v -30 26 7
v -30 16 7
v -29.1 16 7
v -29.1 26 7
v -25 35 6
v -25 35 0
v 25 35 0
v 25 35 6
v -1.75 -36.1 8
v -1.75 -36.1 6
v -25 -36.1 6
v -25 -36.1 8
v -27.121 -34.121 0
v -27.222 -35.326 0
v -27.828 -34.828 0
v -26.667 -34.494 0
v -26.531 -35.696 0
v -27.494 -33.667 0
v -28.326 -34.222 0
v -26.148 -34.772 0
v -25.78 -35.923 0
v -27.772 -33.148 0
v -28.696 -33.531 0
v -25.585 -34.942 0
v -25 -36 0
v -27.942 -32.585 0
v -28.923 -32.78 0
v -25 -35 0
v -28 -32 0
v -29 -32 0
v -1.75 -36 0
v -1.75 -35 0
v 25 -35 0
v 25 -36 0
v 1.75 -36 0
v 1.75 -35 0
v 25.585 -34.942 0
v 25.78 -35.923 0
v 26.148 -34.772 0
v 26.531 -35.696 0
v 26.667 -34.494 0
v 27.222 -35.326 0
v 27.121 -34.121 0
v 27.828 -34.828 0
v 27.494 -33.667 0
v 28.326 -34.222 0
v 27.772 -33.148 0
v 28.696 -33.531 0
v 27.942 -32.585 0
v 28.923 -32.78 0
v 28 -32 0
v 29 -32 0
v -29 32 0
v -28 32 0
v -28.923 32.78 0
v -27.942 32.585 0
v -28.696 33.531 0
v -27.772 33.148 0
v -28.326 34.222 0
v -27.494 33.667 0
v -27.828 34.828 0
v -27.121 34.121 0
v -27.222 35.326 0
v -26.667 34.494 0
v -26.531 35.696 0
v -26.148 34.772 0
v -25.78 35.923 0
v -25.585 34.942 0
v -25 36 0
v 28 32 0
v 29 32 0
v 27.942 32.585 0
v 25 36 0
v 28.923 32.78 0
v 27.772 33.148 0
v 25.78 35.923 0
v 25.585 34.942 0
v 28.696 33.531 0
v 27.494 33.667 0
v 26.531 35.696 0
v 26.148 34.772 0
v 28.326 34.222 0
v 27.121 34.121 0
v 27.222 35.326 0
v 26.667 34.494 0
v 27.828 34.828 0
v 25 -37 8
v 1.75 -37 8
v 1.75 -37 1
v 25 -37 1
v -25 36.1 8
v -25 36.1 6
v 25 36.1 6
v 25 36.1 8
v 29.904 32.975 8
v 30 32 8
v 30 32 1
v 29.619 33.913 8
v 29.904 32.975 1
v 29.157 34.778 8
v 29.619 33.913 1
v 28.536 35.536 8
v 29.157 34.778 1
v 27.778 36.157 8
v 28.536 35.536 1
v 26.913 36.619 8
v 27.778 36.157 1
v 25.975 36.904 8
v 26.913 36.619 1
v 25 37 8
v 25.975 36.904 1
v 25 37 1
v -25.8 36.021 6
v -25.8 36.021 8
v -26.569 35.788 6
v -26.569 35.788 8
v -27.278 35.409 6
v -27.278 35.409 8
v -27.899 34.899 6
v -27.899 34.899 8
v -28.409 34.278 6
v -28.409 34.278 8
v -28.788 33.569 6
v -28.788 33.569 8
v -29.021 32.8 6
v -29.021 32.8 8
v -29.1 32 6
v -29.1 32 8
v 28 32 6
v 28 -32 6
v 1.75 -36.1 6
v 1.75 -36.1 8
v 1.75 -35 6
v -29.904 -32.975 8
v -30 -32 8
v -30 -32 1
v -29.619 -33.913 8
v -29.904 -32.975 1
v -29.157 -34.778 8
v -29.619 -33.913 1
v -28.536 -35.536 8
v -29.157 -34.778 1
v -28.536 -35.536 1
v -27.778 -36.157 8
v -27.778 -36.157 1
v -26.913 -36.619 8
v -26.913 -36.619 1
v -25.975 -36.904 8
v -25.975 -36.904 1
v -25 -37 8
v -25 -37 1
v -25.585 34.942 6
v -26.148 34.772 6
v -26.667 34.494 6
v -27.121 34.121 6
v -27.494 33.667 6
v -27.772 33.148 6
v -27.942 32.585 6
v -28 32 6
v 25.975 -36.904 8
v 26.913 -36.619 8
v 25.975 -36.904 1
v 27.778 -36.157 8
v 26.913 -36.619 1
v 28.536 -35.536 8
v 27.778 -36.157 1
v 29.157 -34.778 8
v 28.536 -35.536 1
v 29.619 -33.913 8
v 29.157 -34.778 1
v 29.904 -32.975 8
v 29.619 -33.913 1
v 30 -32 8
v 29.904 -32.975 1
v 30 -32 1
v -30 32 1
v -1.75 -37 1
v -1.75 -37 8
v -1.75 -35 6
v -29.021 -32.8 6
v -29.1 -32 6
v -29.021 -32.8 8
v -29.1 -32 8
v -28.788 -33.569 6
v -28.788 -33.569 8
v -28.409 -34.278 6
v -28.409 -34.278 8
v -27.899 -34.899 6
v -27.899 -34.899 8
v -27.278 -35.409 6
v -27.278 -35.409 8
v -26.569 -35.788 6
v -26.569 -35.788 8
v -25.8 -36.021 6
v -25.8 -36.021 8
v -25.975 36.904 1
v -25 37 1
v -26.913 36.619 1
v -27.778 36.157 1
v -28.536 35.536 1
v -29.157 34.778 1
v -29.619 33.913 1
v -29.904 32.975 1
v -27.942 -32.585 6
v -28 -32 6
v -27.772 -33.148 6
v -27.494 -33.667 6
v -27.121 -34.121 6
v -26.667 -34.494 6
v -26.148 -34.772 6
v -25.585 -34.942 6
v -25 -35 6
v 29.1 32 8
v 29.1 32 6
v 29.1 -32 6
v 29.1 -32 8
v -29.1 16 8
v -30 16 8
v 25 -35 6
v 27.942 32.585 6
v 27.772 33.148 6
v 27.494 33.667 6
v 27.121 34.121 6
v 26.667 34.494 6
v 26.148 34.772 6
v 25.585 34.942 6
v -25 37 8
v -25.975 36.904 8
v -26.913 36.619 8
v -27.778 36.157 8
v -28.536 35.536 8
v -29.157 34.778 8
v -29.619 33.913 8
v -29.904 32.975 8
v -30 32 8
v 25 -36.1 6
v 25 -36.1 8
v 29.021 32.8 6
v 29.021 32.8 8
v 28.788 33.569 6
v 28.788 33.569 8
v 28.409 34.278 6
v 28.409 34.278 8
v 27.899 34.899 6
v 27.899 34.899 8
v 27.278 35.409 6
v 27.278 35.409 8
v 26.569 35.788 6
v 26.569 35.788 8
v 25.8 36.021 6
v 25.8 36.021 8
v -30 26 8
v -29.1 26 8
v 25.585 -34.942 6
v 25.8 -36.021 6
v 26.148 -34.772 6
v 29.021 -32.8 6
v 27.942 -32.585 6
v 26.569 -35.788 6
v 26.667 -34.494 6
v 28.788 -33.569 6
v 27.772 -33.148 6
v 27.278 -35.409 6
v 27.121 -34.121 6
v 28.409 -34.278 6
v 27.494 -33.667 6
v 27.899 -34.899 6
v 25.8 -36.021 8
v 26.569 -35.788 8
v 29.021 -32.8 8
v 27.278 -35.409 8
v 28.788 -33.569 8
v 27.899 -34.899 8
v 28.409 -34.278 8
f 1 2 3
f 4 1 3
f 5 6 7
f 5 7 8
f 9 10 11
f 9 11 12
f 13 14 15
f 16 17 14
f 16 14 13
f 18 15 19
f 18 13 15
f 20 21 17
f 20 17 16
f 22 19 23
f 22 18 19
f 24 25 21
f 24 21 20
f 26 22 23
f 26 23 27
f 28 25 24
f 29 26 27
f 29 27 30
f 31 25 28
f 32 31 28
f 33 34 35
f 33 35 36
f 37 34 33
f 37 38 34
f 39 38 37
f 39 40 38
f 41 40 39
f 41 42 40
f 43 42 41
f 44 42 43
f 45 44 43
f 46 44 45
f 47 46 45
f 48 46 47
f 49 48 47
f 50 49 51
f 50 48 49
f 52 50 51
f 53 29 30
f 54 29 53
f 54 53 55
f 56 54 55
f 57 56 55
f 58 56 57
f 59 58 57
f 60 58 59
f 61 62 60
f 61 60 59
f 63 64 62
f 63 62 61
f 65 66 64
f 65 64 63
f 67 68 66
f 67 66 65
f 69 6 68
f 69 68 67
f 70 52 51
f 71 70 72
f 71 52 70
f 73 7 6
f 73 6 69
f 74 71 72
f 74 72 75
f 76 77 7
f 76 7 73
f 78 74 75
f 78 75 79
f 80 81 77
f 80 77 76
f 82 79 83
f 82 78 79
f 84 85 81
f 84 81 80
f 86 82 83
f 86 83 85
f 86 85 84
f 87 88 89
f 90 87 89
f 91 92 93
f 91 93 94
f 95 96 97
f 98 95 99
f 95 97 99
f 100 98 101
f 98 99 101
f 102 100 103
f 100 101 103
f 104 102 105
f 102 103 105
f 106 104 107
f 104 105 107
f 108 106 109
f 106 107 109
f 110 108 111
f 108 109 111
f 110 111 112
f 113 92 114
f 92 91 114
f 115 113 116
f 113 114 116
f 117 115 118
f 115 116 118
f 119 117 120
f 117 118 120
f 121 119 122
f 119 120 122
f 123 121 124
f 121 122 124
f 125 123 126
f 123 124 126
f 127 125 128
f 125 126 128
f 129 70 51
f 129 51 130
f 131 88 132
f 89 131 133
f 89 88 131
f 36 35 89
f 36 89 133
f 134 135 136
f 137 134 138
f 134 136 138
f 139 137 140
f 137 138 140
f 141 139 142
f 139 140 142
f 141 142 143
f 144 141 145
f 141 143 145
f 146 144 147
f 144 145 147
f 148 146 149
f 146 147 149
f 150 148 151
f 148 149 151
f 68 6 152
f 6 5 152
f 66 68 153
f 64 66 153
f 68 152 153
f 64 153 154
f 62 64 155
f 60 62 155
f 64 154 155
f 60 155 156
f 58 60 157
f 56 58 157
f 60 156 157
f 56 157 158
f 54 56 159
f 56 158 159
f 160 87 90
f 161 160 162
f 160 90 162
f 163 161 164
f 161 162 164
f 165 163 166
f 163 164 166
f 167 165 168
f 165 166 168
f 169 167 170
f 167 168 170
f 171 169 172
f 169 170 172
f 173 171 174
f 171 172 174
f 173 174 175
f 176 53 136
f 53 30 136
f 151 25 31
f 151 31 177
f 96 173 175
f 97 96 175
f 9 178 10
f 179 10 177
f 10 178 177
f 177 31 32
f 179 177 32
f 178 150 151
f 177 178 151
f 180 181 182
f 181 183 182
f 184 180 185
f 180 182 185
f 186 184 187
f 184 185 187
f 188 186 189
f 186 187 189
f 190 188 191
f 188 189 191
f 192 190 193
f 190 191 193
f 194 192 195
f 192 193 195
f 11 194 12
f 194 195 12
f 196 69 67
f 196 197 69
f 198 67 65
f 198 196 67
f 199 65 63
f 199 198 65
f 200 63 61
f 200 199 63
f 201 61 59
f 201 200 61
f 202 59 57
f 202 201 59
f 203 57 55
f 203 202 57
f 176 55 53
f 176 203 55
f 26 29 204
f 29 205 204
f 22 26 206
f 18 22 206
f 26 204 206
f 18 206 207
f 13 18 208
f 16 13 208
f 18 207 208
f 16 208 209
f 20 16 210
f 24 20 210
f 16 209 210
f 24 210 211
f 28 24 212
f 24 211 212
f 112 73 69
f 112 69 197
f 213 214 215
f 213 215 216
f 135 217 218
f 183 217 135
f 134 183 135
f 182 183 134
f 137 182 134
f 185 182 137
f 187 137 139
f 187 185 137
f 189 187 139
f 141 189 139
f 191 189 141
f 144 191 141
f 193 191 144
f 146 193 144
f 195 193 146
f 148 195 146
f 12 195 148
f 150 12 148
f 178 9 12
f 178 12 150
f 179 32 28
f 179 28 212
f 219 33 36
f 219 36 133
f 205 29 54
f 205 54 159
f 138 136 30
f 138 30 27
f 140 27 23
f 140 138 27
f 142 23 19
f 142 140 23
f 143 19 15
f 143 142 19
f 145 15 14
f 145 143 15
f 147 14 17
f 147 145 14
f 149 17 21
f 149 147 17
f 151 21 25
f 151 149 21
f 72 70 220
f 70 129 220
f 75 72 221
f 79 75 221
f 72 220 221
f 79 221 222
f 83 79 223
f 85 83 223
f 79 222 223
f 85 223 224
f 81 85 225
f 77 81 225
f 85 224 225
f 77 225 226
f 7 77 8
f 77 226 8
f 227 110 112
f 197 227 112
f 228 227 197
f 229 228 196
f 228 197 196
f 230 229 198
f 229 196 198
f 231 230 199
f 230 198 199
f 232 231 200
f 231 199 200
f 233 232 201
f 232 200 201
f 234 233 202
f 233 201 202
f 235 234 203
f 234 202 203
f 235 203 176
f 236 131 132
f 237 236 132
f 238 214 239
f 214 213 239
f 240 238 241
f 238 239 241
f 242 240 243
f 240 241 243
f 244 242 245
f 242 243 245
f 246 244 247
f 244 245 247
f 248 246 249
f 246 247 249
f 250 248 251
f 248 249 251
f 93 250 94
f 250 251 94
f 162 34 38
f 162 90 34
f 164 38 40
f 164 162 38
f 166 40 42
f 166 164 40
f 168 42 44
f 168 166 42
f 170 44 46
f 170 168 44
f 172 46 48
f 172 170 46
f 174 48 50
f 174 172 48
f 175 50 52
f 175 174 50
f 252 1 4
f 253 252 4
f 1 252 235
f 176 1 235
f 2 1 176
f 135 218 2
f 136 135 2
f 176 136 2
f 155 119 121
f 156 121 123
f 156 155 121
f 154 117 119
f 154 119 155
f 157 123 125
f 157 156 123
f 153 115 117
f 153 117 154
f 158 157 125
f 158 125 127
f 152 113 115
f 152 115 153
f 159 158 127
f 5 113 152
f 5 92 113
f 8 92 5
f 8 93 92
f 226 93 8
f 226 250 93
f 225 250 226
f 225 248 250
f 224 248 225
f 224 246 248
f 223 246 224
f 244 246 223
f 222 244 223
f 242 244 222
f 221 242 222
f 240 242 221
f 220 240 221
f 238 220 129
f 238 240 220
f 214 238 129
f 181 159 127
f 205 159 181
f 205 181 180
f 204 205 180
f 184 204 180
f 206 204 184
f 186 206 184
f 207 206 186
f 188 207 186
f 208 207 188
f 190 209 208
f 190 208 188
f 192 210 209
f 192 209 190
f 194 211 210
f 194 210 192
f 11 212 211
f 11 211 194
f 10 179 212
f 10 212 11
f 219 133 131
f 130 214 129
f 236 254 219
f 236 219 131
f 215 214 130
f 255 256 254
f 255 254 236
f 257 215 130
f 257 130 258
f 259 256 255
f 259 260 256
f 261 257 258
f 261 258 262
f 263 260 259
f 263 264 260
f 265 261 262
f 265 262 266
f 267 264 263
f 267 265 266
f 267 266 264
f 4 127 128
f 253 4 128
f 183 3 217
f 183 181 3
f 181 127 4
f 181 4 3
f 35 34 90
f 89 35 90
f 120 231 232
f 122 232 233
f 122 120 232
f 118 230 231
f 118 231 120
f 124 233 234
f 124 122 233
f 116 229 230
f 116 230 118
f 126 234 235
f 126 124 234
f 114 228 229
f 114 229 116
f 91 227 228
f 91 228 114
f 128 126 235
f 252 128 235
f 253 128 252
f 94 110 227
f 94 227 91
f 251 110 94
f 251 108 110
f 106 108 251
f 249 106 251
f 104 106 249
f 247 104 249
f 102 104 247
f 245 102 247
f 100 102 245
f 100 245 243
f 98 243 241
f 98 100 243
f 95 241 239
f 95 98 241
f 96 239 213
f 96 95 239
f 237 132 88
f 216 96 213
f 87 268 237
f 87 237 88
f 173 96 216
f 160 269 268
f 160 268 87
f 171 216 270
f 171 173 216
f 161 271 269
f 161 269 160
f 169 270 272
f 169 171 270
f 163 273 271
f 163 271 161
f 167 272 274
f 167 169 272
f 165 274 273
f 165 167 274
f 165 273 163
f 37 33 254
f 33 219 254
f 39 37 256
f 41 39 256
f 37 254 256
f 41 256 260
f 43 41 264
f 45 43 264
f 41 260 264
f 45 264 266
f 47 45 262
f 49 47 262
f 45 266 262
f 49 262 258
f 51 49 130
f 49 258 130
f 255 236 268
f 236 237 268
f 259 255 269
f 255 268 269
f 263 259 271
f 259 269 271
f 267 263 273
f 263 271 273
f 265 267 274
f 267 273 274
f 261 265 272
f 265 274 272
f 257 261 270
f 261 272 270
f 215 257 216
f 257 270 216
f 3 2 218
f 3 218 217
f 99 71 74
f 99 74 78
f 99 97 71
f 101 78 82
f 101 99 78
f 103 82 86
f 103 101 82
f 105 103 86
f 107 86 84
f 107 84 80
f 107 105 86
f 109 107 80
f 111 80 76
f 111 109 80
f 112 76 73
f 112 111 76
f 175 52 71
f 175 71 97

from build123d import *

# Parameters (mm, degrees)
SKETCH048_W      = 3.5
SKETCH048_H      = 4
EXTRUDE045_DEPTH = 8
SKETCH044_W      = 4
SKETCH044_H      = 10
EXTRUDE041_DEPTH = 1


with BuildPart() as extrude045:
    # Sketch048 → Extrude045 (new body)
    with BuildSketch(Plane.XY):
        with Locations((0, -36)):
            Rectangle(SKETCH048_W, SKETCH048_H)
    extrude(amount=EXTRUDE045_DEPTH)


with BuildPart() as bevel004:
    # Sweep002: sweep along a path in Sketch041
    with BuildLine(Plane(origin=(0, 0, -2), x_dir=(1, 0, 0), z_dir=(0, 0, -1))) as sweep002_path:
        Line((-25, 35), (25, 35))
        ThreePointArc((25, 35), (27.12132, 34.12132), (28, 32))
        Line((28, 32), (28, -32))
        ThreePointArc((28, -32), (27.12132, -34.12132), (25, -35))
        Line((25, -35), (-25, -35))
        ThreePointArc((-25, -35), (-27.12132, -34.12132), (-28, -32))
        Line((-28, -32), (-28, 32))
        ThreePointArc((-28, 32), (-27.12132, 34.12132), (-25, 35))
    # Sketch040 → Sweep002 (sweep)
    with BuildSketch(Plane.XZ):
        Polygon((-28, 11), (-30, 9), (-30, 1), (-28, -1), (-28, -2), (-33, -2), (-33, 12), (-28, 12), align=None)
    sweep(path=sweep002_path.line)


with BuildPart() as compound:
    # Sketch044 → Extrude041 (new body)
    with BuildSketch(Plane.XY.offset(7)):
        with Locations((-29, 21)):
            Rectangle(SKETCH044_W, SKETCH044_H)
    extrude(amount=EXTRUDE041_DEPTH)

    # Compound: union bevel004
    add(bevel004.part)


with BuildPart() as cut039:
    # Sweep001: sweep along a path in Sketch038
    with BuildLine(Plane(origin=(0, 0, 0), x_dir=(1, 0, 0), z_dir=(0, 0, -1))) as sweep001_path:
        Line((-25, 35), (25, 35))
        ThreePointArc((25, 35), (27.12132, 34.12132), (28, 32))
        Line((28, 32), (28, -32))
        ThreePointArc((28, -32), (27.12132, -34.12132), (25, -35))
        Line((25, -35), (-25, -35))
        ThreePointArc((-25, -35), (-27.12132, -34.12132), (-28, -32))
        Line((-28, -32), (-28, 32))
        ThreePointArc((-28, 32), (-27.12132, 34.12132), (-25, 35))
    # Sketch037 → Sweep001 (sweep)
    with BuildSketch(Plane(origin=(0, 0, 0), x_dir=(-1, 0, 0), z_dir=(0, 1, 0))):
        Polygon((-30, 8), (-29.1, 8), (-29.1, 6), (-28, 6), (-28, 0), (-30, 0), align=None)
    sweep(path=sweep001_path.line)

    # Cut037: cut Compound
    add(compound.part, mode=Mode.SUBTRACT)

    # Cut039: cut Extrude045
    add(extrude045.part, mode=Mode.SUBTRACT)


solid = cut039.part
